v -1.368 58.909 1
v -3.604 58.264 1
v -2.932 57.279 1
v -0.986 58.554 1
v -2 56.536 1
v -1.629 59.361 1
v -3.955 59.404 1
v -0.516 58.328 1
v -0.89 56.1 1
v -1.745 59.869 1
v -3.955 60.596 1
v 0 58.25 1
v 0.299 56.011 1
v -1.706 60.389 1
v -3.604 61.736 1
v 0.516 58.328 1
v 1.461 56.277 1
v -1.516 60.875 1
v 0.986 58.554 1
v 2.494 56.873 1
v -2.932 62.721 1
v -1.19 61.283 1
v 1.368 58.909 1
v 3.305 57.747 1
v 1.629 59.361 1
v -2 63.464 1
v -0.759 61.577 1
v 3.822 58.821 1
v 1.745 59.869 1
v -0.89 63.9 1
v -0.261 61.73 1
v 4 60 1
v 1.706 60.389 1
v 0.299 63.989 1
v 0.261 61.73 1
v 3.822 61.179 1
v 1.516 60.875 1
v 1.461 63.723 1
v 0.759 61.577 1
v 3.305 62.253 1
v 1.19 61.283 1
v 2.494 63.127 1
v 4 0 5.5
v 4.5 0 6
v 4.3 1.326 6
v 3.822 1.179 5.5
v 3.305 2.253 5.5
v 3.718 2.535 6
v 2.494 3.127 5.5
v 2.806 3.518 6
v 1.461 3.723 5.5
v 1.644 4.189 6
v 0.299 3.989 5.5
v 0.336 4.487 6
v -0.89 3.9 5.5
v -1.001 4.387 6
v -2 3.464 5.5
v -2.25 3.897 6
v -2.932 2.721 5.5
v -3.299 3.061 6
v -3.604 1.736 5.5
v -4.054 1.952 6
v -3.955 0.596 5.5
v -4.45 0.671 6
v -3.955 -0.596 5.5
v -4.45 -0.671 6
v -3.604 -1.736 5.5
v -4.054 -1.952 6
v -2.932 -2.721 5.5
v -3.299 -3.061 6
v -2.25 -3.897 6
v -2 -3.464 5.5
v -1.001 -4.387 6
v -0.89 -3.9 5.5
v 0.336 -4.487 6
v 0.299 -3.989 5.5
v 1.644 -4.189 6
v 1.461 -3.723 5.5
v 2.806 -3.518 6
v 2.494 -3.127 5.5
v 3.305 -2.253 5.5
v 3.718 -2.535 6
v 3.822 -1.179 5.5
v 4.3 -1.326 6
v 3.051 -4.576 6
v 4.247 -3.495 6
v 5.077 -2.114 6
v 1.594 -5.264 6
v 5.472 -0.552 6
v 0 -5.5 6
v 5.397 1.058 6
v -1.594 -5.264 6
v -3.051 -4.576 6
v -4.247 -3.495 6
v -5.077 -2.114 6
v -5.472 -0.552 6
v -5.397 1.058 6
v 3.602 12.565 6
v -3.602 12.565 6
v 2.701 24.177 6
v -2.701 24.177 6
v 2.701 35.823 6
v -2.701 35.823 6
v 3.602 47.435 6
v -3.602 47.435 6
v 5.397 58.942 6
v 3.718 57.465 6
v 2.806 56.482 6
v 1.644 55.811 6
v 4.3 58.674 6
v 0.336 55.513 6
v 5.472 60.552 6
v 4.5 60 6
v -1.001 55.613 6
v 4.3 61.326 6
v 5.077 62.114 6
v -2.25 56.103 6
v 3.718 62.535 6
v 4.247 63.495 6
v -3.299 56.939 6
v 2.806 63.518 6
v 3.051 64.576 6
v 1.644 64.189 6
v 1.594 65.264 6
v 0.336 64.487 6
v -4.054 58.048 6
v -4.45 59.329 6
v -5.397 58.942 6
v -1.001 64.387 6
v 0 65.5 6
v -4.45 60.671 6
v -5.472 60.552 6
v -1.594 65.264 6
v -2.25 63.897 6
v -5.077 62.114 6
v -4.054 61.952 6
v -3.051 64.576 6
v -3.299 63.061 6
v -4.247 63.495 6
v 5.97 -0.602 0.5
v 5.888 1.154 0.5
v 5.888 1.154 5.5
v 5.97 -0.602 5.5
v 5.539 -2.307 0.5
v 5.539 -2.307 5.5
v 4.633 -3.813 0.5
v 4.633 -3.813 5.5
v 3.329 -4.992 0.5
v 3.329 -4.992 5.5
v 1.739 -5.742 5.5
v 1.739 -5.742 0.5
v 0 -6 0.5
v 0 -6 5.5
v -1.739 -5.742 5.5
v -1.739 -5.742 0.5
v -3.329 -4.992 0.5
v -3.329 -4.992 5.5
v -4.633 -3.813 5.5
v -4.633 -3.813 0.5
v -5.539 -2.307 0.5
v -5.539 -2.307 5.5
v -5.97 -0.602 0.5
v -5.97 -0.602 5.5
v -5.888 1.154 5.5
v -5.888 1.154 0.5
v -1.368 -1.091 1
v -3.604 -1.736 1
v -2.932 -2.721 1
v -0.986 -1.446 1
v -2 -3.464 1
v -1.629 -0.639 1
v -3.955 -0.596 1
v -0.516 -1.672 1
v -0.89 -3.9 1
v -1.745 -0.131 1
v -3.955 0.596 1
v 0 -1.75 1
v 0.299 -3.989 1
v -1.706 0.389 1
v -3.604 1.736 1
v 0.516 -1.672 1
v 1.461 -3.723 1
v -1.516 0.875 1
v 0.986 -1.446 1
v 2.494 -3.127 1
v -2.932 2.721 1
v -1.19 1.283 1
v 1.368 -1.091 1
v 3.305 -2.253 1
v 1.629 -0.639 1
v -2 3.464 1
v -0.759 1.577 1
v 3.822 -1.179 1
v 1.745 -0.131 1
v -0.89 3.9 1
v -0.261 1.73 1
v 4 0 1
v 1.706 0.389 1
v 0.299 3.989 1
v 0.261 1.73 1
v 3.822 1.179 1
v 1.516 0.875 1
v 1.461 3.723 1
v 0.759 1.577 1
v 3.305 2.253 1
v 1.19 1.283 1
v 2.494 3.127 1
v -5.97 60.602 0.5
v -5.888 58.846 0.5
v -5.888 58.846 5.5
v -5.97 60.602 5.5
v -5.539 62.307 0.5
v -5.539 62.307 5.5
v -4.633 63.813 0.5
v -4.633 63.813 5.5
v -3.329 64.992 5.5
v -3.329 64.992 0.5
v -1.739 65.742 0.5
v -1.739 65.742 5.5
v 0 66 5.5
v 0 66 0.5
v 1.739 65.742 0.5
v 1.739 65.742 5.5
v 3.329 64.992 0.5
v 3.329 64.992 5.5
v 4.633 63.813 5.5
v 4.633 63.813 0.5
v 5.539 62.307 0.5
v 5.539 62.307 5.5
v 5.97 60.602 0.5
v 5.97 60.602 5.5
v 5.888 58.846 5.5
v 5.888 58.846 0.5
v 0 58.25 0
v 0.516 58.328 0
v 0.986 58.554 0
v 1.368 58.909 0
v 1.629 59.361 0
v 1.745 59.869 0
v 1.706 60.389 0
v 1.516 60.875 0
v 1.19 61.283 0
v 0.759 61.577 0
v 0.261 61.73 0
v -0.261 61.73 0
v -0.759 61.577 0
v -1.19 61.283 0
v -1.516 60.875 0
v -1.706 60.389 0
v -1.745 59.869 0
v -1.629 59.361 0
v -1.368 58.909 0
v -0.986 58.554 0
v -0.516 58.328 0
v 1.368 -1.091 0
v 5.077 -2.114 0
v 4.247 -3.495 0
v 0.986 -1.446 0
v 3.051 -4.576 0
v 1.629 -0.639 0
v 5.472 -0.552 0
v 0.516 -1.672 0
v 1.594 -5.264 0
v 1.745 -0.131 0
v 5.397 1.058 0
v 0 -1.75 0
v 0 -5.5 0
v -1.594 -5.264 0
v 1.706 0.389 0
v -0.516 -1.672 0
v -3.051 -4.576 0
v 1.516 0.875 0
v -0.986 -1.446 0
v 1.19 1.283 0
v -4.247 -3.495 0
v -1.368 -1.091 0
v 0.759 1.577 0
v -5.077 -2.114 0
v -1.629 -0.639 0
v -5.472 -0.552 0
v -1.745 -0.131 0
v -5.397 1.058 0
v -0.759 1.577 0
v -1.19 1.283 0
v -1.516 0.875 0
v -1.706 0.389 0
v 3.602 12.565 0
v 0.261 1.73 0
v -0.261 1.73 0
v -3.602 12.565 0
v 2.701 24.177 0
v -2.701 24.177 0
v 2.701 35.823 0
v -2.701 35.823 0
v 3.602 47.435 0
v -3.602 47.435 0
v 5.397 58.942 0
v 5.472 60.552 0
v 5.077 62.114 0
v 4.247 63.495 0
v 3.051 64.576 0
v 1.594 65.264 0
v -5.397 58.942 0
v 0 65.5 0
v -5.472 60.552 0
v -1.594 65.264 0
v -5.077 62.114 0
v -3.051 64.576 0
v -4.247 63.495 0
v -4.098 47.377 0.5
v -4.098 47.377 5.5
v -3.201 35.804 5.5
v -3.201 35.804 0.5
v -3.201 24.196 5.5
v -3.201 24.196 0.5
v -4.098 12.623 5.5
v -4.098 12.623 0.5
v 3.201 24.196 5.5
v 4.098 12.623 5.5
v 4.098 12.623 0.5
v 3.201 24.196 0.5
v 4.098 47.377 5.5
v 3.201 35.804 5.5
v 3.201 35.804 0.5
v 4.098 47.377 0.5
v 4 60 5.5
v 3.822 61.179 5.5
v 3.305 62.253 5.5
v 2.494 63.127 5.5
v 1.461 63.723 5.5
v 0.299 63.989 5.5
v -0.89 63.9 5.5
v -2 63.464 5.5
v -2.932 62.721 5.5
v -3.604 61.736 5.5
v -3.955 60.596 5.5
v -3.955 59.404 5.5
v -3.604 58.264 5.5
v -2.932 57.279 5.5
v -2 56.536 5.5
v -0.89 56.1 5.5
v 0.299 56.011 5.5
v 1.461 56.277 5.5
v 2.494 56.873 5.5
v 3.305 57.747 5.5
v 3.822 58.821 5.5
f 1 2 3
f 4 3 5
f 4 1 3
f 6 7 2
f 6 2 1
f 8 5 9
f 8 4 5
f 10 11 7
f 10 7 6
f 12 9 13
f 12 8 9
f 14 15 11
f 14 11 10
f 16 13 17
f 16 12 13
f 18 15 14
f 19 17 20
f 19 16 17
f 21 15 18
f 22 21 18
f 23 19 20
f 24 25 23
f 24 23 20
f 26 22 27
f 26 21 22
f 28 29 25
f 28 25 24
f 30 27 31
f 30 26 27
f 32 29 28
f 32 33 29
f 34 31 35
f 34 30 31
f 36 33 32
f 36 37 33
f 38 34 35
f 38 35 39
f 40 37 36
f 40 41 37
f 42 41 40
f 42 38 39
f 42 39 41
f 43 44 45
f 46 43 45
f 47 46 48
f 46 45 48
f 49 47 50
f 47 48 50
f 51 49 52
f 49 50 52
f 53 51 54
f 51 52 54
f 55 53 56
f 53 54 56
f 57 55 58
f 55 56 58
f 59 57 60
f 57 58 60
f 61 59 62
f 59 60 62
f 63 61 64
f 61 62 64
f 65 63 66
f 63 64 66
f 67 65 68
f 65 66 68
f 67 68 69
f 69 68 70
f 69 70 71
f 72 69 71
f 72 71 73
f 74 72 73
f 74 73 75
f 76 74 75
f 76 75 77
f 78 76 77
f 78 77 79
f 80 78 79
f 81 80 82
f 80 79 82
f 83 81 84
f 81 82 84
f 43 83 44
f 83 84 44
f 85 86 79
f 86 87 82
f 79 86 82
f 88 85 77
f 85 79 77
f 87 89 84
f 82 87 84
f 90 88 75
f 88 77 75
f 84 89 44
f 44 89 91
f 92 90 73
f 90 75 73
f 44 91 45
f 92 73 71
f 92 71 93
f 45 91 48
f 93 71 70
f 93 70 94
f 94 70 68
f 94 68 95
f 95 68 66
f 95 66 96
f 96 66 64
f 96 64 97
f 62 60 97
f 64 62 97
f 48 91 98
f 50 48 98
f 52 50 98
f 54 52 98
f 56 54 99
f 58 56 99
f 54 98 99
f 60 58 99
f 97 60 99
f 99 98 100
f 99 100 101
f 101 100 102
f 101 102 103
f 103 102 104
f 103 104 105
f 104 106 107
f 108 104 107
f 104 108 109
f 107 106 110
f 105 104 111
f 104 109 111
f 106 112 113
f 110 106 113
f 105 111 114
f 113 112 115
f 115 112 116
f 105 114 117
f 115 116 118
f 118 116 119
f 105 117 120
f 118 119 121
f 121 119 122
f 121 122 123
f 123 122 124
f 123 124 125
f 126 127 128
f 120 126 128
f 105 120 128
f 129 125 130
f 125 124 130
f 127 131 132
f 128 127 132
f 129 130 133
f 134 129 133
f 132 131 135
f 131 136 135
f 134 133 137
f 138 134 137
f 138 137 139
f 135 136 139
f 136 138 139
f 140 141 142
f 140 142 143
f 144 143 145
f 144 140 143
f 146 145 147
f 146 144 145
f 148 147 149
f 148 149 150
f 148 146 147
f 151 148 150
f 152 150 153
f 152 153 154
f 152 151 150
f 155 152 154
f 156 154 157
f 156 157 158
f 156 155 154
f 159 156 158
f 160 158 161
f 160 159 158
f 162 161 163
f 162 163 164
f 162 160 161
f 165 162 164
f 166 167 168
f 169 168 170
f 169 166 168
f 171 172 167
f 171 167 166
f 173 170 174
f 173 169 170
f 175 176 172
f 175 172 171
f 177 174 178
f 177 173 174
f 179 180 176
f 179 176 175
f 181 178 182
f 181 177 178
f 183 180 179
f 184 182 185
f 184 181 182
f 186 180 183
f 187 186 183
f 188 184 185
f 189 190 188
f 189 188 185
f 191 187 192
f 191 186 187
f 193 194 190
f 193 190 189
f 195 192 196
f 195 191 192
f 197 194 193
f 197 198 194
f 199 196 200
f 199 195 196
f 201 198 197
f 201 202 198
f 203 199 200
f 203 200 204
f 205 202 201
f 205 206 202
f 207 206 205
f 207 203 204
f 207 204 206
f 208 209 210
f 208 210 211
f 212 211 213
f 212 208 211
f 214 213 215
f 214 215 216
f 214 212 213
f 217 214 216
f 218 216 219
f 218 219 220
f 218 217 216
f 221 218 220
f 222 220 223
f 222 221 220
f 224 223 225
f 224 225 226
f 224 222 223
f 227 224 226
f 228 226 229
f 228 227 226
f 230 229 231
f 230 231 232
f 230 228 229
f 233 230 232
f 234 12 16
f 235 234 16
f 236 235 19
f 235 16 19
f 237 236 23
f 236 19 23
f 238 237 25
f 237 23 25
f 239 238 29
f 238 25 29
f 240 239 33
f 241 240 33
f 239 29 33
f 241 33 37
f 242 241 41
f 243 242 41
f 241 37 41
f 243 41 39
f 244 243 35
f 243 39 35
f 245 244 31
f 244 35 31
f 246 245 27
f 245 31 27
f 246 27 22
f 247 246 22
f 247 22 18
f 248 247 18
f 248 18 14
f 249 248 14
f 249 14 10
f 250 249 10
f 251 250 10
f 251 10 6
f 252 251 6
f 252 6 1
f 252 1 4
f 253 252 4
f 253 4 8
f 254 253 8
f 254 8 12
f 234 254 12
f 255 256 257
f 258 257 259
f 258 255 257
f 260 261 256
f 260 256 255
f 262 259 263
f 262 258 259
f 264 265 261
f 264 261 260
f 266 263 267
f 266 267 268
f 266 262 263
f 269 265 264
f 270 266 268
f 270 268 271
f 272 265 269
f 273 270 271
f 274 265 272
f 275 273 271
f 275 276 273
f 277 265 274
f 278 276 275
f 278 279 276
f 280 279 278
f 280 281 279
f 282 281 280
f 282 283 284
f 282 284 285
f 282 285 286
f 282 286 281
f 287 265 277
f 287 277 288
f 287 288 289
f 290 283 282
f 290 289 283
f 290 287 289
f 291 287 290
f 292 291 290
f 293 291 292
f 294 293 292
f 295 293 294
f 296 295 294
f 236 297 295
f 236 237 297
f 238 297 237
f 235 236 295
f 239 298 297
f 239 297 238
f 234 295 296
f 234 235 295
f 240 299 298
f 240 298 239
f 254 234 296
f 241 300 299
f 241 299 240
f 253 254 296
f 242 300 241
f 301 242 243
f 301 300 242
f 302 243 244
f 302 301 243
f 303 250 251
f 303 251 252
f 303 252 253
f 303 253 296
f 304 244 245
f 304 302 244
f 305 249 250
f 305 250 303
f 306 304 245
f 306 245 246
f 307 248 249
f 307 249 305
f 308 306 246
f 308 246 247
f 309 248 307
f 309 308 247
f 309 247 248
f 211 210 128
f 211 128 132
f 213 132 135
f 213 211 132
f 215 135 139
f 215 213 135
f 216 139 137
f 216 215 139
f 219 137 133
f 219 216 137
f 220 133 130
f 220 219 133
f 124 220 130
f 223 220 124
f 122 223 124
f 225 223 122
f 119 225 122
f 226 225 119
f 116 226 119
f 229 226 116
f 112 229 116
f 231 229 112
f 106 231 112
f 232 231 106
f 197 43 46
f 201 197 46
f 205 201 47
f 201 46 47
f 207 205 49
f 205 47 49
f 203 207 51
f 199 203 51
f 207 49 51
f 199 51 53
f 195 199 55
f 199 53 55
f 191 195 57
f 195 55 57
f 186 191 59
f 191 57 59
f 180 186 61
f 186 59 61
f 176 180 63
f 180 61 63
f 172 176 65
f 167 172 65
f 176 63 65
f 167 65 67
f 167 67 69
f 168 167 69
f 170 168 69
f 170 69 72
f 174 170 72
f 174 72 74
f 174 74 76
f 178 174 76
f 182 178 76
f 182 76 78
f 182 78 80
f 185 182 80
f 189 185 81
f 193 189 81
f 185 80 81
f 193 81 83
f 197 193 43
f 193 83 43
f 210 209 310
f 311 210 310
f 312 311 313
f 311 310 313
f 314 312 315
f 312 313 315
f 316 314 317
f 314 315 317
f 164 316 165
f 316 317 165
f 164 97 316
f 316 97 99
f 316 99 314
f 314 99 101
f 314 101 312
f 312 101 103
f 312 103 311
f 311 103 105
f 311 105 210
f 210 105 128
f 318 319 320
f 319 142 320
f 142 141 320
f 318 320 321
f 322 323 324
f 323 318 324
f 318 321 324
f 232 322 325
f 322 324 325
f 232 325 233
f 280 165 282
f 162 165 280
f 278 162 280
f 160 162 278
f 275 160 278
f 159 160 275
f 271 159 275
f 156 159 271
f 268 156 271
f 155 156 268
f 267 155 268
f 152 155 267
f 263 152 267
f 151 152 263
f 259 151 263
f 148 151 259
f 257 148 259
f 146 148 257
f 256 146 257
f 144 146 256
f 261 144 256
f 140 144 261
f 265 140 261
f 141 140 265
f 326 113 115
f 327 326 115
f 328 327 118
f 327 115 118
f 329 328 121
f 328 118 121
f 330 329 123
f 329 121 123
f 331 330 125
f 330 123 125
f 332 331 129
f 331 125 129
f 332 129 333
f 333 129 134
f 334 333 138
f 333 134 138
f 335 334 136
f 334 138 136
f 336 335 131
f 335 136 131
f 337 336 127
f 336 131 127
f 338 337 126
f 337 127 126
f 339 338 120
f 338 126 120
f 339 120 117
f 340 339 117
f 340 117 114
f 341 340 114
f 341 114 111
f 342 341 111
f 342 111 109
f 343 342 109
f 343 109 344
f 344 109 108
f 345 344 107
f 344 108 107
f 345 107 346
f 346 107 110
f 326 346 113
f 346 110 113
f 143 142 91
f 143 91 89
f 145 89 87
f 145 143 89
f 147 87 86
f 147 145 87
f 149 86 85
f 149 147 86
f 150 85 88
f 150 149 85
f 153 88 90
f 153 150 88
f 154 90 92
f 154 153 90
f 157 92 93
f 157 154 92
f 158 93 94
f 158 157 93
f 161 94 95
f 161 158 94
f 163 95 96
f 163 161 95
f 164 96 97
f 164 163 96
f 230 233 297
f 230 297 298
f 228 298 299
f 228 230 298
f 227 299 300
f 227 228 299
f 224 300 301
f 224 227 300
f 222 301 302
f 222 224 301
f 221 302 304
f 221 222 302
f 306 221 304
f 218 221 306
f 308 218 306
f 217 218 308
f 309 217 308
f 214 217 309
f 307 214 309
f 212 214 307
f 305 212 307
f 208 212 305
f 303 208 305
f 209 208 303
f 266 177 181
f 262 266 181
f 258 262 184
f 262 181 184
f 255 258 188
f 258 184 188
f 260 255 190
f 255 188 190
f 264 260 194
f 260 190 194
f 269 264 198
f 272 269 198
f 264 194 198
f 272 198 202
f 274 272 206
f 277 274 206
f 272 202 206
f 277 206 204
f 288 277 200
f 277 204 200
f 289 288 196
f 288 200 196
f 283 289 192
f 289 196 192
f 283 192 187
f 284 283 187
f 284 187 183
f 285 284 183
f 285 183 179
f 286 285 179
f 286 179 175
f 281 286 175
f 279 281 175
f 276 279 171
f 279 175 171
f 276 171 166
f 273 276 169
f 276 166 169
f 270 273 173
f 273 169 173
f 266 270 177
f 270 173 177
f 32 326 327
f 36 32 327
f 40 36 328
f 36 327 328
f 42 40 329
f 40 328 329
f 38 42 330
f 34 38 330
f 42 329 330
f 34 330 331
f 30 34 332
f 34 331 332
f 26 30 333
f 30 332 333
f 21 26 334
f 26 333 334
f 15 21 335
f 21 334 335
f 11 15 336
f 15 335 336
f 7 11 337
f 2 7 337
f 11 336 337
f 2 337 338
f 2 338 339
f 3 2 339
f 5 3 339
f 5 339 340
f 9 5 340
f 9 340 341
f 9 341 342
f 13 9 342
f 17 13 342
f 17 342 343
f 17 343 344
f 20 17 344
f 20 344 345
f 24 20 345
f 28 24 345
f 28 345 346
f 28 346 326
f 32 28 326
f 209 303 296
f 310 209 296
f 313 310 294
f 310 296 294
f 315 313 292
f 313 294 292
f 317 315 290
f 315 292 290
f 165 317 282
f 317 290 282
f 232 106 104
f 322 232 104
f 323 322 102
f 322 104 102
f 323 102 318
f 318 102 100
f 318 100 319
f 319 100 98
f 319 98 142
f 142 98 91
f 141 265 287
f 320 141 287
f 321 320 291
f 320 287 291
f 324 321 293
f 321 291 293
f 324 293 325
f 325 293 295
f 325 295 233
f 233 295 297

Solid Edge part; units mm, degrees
sketch "Sketch1" plane through (0, 0, 0) normal (0, 0, 1) x (1, 0, 0)
  arc A0 (5.888, 58.8462) -> (5.888, 1.1538) centre (153.0882, 30) ccw
  arc A1 (-5.888, 58.8462) -> (-5.888, 1.1538) centre (-153.0882, 30) cw
  arc A2 (5.888, 1.1538) -> (-5.888, 1.1538) centre (0, 0) cw
  arc A3 (-5.888, 58.8462) -> (5.888, 58.8462) centre (0, 60) cw
extrude "Protrusion1" add sketch "Sketch1" along normal blind 6
sketch "Sketch2" plane through (0, 30, 6) normal (0, 0, 1) x (1, 0, 0)
  circle A0 centre (0, -30) radius 4
  circle A1 centre (0, 30) radius 4
  dimension "D1" = 8
  dimension "D2" = 8
extrude "VaciadoExtruido_1" cut sketch "Sketch2" against normal blind 5
hole "Agujero_1" at (0, 60, 1) direction (0, 0, -1) diameter 3.5 end up to next
hole "Hole1" at (0, 0, 1) direction (0, 0, -1) diameter 3.5 end up to next
chamfer "Chaflán_1" distance 0.5 angle 45 10 edges at (3.0882, 30, 6) (0, -6, 6) (-3.0882, 30, 6) (0, 66, 6) (3.0882, 30, 0) (0, -6, 0) (-3.0882, 30, 0) (0, 66, 0) (-4, 0, 6) (-4, 60, 6)
